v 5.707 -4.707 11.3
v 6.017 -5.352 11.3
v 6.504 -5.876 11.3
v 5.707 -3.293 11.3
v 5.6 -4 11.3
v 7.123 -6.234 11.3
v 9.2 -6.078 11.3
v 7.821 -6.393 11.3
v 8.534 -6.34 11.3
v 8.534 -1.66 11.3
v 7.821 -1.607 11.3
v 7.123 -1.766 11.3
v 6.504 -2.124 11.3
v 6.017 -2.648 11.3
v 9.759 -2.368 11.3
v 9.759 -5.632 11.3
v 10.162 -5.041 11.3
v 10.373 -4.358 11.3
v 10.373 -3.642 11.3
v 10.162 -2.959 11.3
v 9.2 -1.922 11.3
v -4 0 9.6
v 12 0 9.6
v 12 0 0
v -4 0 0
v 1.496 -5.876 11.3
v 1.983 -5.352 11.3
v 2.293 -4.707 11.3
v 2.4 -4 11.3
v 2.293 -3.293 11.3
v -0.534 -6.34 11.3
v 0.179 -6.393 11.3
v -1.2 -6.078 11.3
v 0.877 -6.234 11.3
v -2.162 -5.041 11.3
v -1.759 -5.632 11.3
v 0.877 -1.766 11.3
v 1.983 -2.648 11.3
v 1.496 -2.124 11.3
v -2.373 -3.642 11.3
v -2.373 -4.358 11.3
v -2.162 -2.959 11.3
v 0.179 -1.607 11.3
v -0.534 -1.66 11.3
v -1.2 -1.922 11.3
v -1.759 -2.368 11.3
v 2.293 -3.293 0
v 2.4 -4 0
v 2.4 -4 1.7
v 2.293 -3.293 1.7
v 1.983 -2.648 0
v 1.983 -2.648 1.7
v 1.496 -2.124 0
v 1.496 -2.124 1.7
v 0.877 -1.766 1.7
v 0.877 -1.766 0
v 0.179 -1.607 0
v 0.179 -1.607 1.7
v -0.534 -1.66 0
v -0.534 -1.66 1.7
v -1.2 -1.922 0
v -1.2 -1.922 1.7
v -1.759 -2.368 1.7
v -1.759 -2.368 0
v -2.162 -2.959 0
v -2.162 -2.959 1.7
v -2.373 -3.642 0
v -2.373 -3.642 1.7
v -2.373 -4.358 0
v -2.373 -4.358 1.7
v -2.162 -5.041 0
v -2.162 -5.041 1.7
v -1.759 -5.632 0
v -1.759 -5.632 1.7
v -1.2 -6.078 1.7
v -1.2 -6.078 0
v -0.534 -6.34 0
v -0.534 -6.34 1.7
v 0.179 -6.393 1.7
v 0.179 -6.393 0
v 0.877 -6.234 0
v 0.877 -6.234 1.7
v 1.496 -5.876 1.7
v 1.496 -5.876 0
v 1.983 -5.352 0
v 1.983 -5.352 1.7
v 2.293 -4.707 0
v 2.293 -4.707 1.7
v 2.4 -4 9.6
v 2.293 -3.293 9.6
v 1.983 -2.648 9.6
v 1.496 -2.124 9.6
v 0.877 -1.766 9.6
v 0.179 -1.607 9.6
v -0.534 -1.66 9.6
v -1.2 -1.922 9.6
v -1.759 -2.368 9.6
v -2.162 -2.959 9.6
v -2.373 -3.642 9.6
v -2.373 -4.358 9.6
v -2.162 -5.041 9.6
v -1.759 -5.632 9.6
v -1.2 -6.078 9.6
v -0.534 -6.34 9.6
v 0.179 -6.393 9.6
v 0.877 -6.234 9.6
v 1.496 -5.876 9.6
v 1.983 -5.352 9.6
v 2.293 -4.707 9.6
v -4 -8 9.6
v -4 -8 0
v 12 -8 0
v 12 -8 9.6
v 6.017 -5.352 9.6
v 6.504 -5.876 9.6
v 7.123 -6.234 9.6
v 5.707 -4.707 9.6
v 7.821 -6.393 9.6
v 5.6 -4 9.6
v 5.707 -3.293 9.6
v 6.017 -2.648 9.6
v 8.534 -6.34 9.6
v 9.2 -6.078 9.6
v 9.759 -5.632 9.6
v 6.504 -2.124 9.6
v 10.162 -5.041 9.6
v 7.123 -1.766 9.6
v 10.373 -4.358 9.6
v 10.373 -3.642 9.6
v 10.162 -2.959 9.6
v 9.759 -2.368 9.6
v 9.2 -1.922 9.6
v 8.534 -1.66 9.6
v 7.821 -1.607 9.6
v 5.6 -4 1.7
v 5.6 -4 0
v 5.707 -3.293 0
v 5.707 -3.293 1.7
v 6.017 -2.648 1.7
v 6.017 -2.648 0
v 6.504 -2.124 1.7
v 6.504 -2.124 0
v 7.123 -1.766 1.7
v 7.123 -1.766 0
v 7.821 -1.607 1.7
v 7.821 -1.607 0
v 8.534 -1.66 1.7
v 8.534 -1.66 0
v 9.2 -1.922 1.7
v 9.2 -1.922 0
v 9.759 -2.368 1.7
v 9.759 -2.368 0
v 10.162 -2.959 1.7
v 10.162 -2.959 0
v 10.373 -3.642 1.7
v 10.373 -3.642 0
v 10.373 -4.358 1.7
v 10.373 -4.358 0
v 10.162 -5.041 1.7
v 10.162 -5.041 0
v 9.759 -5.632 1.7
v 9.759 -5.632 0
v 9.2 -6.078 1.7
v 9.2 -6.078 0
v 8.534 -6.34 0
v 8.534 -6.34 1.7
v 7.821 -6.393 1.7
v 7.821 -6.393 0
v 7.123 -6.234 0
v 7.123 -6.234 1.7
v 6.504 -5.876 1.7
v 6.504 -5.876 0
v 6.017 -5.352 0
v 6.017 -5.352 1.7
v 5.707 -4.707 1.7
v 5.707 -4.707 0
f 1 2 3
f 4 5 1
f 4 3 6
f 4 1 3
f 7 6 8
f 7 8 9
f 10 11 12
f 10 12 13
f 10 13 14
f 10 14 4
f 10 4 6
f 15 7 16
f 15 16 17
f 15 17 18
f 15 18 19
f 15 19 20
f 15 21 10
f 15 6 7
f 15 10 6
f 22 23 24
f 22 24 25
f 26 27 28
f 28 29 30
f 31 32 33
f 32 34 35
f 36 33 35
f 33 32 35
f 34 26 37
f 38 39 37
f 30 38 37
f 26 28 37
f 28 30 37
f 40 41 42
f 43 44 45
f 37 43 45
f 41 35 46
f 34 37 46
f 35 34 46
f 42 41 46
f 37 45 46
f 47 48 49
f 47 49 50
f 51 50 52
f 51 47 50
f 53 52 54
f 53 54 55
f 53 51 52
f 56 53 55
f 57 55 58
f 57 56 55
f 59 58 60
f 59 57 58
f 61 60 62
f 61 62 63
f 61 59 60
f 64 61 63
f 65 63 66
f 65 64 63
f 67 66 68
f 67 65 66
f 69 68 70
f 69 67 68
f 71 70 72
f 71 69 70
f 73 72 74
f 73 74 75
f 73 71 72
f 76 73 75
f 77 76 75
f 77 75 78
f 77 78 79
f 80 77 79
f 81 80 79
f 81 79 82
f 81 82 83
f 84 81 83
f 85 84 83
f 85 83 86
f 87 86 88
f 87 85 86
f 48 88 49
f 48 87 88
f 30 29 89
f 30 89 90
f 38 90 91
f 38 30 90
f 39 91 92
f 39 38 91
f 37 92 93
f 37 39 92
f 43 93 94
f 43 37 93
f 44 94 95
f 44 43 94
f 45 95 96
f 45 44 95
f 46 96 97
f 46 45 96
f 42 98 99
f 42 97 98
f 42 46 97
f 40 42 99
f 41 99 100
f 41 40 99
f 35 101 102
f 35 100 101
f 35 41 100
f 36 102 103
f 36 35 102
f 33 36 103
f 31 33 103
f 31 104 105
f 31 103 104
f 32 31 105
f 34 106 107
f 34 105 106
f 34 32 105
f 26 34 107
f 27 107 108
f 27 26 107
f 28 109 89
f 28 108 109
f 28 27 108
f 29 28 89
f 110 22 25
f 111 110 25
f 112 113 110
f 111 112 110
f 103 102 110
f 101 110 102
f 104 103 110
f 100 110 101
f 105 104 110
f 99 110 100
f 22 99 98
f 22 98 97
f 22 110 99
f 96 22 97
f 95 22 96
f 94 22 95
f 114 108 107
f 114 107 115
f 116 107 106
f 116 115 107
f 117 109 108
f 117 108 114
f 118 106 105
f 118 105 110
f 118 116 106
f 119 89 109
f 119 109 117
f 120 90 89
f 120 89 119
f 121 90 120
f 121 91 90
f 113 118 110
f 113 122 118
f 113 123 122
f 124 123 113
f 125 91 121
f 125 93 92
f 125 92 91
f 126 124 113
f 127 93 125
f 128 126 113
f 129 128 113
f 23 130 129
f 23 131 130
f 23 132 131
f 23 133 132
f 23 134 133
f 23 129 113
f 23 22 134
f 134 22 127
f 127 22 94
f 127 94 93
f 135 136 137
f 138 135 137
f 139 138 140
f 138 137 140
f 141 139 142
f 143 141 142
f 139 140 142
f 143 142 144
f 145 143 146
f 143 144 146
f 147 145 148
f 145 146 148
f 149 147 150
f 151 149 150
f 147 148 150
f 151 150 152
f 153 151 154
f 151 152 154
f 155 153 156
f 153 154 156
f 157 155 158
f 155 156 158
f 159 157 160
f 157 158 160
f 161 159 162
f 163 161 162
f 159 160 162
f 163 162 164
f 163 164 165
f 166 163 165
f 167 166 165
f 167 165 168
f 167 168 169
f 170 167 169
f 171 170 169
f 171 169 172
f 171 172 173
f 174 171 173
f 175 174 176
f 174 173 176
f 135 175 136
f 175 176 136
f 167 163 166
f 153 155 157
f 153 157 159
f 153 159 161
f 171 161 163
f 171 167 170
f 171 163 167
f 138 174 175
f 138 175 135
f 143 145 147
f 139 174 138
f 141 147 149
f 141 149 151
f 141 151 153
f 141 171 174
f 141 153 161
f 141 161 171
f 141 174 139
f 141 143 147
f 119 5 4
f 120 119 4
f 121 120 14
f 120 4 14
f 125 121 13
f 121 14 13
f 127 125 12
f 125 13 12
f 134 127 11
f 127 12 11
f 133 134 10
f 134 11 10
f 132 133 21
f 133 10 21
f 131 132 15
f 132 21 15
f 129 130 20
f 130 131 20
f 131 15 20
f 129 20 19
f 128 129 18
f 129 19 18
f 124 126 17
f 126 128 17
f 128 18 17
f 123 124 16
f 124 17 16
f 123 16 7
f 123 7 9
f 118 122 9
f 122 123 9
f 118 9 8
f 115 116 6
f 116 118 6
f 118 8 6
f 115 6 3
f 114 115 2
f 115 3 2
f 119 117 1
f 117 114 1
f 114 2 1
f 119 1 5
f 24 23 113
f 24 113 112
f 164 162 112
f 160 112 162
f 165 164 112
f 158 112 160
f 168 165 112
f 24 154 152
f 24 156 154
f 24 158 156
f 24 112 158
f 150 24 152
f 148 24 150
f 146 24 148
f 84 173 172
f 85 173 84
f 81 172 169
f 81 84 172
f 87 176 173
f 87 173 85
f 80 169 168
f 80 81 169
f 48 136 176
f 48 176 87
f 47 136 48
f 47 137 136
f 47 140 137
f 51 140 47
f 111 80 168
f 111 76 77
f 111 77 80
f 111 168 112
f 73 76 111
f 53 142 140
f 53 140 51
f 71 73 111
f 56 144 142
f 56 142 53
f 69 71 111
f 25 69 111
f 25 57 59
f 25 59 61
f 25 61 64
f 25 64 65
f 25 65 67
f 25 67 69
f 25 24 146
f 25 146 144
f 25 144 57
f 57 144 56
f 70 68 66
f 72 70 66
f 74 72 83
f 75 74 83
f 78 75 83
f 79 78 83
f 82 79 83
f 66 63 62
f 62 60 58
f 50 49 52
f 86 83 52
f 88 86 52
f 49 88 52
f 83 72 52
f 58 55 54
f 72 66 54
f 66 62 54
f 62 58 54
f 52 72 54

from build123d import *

# Parameters (mm, degrees)
F1_DEPTH = 8
F3_W     = 8
F3_H     = 8
F3_R     = 2.4
F4_DEPTH = 1.7
F5_R     = 2.4
F6_DEPTH = 1.7


with BuildPart() as f1:
    # F0 (on Front) → F1 (new body)
    with BuildSketch(Plane.XZ):
        Polygon((-2.4, 9.6), (-4, 9.6), (-4, 0), (4, 0), (4, 9.6), (2.4, 9.6), (2.4, 11.3), (-2.4, 11.3), align=None)
    extrude(amount=F1_DEPTH)

    # F3 (on plane+point) → F4 (cut, through all)
    with BuildSketch(Plane.XY.offset(11.3)):
        with Locations((0, -4)):
            Rectangle(F3_W, F3_H)
        with Locations((0, -4)):
            Circle(F3_R, mode=Mode.SUBTRACT)
    extrude(amount=-F4_DEPTH, mode=Mode.SUBTRACT)

    # F5 (on Top) → F6 (cut)
    with BuildSketch(Plane.XY):
        with Locations((0, -4)):
            Circle(F5_R)
    extrude(amount=F6_DEPTH, mode=Mode.SUBTRACT)

    # F8: F1 across plane


with BuildPart() as f1_1:
    add(f1.part)
    add(f1.part.mirror(Plane.YZ.offset(4)))


solid = f1_1.part
